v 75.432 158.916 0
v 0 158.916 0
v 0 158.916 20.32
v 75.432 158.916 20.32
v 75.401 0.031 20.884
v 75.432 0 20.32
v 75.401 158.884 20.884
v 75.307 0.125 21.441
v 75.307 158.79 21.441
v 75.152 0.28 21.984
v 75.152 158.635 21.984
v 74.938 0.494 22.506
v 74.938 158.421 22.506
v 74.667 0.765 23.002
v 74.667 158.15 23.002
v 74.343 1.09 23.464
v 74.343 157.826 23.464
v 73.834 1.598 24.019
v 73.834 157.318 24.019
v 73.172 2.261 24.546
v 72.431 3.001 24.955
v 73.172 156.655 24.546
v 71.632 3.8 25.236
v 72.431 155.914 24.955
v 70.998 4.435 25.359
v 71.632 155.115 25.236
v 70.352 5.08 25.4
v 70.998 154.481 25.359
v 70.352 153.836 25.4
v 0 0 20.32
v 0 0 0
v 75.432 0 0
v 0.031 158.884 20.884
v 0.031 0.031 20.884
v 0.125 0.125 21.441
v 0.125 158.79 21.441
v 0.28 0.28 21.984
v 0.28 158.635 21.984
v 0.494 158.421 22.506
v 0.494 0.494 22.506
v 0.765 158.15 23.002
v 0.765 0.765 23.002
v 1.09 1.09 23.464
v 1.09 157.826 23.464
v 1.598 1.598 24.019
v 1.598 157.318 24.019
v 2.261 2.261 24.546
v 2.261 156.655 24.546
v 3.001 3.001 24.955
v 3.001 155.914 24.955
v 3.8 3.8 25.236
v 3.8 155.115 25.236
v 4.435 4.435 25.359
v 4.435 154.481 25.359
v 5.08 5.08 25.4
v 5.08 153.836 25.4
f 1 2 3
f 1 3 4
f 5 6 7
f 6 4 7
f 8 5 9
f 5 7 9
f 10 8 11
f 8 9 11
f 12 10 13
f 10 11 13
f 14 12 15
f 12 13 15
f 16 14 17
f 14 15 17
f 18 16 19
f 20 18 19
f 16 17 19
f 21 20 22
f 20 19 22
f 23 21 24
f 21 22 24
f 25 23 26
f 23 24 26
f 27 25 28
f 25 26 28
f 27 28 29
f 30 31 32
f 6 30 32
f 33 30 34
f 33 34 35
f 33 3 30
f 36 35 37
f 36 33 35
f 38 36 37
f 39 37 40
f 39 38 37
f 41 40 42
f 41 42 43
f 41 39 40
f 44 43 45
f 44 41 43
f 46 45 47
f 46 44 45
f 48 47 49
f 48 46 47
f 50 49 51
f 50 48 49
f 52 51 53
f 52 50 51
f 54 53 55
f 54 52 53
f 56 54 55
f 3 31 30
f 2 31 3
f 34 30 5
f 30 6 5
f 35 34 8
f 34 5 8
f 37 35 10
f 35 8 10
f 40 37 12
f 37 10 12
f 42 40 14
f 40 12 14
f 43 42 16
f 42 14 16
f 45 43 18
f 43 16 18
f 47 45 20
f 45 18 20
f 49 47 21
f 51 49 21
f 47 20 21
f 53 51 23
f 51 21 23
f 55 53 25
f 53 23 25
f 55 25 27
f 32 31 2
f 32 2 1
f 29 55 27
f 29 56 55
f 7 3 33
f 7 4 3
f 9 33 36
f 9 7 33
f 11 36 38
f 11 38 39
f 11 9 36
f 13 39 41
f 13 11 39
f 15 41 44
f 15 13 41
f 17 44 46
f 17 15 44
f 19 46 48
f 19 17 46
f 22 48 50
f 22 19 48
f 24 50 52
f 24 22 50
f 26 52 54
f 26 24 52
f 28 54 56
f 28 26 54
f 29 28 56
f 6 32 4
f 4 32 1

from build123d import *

# Parameters (mm, degrees)
F0_W      = 76.2
F0_H      = 76.2
F1_DEPTH  = 76.2
F2_R      = 5.08
F4_W      = 76.2
F4_H      = 76.2
F5_DEPTH  = 76.2
F6_W      = 50.8
F6_H      = 50.8
F7_DEPTH  = 50.8
F9_W      = 75.4324346781
F9_H      = 158.9155644178
F10_DEPTH = 25.4
F11_R     = 5.08


with BuildPart() as f1:
    # F0 (on Top) → F1 (new body)
    with BuildSketch(Plane.XY):
        with Locations((-38.1, 38.1)):
            Rectangle(F0_W, F0_H)
    extrude(amount=F1_DEPTH)

    # F2
    f2_edges = [f1.edges().sort_by_distance(p)[0] for p in [
        (-38.1, 0, 76.2),
        (0, 0, 38.1),
        (0, 76.2, 38.1),
        (0, 38.1, 0),
        (0, 38.1, 76.2),
        (-38.1, 76.2, 76.2),
        (-76.2, 38.1, 76.2),
        (-76.2, 0, 38.1),
    ]]
    fillet(f2_edges, radius=F2_R)


with BuildPart() as f5:
    # F4 (on Top) → F5 (new body)
    with BuildSketch(Plane.XY):
        with Locations((-38.1, 38.1)):
            Rectangle(F4_W, F4_H)
    extrude(amount=F5_DEPTH)

    # F6 (on face) → F7 (join)
    with BuildSketch(Plane.YZ):
        with Locations((46.7064439595, 25.4)):
            Rectangle(F6_W, F6_H)
    extrude(amount=F7_DEPTH)


with BuildPart() as f10:
    # F9 (on Top) → F10 (new body)
    with BuildSketch(Plane.XY):
        with Locations((37.716217339, 79.4577822089)):
            Rectangle(F9_W, F9_H)
    extrude(amount=F10_DEPTH)

    # F11
    f11_edges = [f10.edges().sort_by_distance(p)[0] for p in [
        (37.716217, 0, 25.4),
        (75.432435, 79.457782, 25.4),
        (37.716217, 158.915564, 25.4),
        (0, 79.457782, 25.4),
    ]]
    fillet(f11_edges, radius=F11_R)


solid = f10.part
